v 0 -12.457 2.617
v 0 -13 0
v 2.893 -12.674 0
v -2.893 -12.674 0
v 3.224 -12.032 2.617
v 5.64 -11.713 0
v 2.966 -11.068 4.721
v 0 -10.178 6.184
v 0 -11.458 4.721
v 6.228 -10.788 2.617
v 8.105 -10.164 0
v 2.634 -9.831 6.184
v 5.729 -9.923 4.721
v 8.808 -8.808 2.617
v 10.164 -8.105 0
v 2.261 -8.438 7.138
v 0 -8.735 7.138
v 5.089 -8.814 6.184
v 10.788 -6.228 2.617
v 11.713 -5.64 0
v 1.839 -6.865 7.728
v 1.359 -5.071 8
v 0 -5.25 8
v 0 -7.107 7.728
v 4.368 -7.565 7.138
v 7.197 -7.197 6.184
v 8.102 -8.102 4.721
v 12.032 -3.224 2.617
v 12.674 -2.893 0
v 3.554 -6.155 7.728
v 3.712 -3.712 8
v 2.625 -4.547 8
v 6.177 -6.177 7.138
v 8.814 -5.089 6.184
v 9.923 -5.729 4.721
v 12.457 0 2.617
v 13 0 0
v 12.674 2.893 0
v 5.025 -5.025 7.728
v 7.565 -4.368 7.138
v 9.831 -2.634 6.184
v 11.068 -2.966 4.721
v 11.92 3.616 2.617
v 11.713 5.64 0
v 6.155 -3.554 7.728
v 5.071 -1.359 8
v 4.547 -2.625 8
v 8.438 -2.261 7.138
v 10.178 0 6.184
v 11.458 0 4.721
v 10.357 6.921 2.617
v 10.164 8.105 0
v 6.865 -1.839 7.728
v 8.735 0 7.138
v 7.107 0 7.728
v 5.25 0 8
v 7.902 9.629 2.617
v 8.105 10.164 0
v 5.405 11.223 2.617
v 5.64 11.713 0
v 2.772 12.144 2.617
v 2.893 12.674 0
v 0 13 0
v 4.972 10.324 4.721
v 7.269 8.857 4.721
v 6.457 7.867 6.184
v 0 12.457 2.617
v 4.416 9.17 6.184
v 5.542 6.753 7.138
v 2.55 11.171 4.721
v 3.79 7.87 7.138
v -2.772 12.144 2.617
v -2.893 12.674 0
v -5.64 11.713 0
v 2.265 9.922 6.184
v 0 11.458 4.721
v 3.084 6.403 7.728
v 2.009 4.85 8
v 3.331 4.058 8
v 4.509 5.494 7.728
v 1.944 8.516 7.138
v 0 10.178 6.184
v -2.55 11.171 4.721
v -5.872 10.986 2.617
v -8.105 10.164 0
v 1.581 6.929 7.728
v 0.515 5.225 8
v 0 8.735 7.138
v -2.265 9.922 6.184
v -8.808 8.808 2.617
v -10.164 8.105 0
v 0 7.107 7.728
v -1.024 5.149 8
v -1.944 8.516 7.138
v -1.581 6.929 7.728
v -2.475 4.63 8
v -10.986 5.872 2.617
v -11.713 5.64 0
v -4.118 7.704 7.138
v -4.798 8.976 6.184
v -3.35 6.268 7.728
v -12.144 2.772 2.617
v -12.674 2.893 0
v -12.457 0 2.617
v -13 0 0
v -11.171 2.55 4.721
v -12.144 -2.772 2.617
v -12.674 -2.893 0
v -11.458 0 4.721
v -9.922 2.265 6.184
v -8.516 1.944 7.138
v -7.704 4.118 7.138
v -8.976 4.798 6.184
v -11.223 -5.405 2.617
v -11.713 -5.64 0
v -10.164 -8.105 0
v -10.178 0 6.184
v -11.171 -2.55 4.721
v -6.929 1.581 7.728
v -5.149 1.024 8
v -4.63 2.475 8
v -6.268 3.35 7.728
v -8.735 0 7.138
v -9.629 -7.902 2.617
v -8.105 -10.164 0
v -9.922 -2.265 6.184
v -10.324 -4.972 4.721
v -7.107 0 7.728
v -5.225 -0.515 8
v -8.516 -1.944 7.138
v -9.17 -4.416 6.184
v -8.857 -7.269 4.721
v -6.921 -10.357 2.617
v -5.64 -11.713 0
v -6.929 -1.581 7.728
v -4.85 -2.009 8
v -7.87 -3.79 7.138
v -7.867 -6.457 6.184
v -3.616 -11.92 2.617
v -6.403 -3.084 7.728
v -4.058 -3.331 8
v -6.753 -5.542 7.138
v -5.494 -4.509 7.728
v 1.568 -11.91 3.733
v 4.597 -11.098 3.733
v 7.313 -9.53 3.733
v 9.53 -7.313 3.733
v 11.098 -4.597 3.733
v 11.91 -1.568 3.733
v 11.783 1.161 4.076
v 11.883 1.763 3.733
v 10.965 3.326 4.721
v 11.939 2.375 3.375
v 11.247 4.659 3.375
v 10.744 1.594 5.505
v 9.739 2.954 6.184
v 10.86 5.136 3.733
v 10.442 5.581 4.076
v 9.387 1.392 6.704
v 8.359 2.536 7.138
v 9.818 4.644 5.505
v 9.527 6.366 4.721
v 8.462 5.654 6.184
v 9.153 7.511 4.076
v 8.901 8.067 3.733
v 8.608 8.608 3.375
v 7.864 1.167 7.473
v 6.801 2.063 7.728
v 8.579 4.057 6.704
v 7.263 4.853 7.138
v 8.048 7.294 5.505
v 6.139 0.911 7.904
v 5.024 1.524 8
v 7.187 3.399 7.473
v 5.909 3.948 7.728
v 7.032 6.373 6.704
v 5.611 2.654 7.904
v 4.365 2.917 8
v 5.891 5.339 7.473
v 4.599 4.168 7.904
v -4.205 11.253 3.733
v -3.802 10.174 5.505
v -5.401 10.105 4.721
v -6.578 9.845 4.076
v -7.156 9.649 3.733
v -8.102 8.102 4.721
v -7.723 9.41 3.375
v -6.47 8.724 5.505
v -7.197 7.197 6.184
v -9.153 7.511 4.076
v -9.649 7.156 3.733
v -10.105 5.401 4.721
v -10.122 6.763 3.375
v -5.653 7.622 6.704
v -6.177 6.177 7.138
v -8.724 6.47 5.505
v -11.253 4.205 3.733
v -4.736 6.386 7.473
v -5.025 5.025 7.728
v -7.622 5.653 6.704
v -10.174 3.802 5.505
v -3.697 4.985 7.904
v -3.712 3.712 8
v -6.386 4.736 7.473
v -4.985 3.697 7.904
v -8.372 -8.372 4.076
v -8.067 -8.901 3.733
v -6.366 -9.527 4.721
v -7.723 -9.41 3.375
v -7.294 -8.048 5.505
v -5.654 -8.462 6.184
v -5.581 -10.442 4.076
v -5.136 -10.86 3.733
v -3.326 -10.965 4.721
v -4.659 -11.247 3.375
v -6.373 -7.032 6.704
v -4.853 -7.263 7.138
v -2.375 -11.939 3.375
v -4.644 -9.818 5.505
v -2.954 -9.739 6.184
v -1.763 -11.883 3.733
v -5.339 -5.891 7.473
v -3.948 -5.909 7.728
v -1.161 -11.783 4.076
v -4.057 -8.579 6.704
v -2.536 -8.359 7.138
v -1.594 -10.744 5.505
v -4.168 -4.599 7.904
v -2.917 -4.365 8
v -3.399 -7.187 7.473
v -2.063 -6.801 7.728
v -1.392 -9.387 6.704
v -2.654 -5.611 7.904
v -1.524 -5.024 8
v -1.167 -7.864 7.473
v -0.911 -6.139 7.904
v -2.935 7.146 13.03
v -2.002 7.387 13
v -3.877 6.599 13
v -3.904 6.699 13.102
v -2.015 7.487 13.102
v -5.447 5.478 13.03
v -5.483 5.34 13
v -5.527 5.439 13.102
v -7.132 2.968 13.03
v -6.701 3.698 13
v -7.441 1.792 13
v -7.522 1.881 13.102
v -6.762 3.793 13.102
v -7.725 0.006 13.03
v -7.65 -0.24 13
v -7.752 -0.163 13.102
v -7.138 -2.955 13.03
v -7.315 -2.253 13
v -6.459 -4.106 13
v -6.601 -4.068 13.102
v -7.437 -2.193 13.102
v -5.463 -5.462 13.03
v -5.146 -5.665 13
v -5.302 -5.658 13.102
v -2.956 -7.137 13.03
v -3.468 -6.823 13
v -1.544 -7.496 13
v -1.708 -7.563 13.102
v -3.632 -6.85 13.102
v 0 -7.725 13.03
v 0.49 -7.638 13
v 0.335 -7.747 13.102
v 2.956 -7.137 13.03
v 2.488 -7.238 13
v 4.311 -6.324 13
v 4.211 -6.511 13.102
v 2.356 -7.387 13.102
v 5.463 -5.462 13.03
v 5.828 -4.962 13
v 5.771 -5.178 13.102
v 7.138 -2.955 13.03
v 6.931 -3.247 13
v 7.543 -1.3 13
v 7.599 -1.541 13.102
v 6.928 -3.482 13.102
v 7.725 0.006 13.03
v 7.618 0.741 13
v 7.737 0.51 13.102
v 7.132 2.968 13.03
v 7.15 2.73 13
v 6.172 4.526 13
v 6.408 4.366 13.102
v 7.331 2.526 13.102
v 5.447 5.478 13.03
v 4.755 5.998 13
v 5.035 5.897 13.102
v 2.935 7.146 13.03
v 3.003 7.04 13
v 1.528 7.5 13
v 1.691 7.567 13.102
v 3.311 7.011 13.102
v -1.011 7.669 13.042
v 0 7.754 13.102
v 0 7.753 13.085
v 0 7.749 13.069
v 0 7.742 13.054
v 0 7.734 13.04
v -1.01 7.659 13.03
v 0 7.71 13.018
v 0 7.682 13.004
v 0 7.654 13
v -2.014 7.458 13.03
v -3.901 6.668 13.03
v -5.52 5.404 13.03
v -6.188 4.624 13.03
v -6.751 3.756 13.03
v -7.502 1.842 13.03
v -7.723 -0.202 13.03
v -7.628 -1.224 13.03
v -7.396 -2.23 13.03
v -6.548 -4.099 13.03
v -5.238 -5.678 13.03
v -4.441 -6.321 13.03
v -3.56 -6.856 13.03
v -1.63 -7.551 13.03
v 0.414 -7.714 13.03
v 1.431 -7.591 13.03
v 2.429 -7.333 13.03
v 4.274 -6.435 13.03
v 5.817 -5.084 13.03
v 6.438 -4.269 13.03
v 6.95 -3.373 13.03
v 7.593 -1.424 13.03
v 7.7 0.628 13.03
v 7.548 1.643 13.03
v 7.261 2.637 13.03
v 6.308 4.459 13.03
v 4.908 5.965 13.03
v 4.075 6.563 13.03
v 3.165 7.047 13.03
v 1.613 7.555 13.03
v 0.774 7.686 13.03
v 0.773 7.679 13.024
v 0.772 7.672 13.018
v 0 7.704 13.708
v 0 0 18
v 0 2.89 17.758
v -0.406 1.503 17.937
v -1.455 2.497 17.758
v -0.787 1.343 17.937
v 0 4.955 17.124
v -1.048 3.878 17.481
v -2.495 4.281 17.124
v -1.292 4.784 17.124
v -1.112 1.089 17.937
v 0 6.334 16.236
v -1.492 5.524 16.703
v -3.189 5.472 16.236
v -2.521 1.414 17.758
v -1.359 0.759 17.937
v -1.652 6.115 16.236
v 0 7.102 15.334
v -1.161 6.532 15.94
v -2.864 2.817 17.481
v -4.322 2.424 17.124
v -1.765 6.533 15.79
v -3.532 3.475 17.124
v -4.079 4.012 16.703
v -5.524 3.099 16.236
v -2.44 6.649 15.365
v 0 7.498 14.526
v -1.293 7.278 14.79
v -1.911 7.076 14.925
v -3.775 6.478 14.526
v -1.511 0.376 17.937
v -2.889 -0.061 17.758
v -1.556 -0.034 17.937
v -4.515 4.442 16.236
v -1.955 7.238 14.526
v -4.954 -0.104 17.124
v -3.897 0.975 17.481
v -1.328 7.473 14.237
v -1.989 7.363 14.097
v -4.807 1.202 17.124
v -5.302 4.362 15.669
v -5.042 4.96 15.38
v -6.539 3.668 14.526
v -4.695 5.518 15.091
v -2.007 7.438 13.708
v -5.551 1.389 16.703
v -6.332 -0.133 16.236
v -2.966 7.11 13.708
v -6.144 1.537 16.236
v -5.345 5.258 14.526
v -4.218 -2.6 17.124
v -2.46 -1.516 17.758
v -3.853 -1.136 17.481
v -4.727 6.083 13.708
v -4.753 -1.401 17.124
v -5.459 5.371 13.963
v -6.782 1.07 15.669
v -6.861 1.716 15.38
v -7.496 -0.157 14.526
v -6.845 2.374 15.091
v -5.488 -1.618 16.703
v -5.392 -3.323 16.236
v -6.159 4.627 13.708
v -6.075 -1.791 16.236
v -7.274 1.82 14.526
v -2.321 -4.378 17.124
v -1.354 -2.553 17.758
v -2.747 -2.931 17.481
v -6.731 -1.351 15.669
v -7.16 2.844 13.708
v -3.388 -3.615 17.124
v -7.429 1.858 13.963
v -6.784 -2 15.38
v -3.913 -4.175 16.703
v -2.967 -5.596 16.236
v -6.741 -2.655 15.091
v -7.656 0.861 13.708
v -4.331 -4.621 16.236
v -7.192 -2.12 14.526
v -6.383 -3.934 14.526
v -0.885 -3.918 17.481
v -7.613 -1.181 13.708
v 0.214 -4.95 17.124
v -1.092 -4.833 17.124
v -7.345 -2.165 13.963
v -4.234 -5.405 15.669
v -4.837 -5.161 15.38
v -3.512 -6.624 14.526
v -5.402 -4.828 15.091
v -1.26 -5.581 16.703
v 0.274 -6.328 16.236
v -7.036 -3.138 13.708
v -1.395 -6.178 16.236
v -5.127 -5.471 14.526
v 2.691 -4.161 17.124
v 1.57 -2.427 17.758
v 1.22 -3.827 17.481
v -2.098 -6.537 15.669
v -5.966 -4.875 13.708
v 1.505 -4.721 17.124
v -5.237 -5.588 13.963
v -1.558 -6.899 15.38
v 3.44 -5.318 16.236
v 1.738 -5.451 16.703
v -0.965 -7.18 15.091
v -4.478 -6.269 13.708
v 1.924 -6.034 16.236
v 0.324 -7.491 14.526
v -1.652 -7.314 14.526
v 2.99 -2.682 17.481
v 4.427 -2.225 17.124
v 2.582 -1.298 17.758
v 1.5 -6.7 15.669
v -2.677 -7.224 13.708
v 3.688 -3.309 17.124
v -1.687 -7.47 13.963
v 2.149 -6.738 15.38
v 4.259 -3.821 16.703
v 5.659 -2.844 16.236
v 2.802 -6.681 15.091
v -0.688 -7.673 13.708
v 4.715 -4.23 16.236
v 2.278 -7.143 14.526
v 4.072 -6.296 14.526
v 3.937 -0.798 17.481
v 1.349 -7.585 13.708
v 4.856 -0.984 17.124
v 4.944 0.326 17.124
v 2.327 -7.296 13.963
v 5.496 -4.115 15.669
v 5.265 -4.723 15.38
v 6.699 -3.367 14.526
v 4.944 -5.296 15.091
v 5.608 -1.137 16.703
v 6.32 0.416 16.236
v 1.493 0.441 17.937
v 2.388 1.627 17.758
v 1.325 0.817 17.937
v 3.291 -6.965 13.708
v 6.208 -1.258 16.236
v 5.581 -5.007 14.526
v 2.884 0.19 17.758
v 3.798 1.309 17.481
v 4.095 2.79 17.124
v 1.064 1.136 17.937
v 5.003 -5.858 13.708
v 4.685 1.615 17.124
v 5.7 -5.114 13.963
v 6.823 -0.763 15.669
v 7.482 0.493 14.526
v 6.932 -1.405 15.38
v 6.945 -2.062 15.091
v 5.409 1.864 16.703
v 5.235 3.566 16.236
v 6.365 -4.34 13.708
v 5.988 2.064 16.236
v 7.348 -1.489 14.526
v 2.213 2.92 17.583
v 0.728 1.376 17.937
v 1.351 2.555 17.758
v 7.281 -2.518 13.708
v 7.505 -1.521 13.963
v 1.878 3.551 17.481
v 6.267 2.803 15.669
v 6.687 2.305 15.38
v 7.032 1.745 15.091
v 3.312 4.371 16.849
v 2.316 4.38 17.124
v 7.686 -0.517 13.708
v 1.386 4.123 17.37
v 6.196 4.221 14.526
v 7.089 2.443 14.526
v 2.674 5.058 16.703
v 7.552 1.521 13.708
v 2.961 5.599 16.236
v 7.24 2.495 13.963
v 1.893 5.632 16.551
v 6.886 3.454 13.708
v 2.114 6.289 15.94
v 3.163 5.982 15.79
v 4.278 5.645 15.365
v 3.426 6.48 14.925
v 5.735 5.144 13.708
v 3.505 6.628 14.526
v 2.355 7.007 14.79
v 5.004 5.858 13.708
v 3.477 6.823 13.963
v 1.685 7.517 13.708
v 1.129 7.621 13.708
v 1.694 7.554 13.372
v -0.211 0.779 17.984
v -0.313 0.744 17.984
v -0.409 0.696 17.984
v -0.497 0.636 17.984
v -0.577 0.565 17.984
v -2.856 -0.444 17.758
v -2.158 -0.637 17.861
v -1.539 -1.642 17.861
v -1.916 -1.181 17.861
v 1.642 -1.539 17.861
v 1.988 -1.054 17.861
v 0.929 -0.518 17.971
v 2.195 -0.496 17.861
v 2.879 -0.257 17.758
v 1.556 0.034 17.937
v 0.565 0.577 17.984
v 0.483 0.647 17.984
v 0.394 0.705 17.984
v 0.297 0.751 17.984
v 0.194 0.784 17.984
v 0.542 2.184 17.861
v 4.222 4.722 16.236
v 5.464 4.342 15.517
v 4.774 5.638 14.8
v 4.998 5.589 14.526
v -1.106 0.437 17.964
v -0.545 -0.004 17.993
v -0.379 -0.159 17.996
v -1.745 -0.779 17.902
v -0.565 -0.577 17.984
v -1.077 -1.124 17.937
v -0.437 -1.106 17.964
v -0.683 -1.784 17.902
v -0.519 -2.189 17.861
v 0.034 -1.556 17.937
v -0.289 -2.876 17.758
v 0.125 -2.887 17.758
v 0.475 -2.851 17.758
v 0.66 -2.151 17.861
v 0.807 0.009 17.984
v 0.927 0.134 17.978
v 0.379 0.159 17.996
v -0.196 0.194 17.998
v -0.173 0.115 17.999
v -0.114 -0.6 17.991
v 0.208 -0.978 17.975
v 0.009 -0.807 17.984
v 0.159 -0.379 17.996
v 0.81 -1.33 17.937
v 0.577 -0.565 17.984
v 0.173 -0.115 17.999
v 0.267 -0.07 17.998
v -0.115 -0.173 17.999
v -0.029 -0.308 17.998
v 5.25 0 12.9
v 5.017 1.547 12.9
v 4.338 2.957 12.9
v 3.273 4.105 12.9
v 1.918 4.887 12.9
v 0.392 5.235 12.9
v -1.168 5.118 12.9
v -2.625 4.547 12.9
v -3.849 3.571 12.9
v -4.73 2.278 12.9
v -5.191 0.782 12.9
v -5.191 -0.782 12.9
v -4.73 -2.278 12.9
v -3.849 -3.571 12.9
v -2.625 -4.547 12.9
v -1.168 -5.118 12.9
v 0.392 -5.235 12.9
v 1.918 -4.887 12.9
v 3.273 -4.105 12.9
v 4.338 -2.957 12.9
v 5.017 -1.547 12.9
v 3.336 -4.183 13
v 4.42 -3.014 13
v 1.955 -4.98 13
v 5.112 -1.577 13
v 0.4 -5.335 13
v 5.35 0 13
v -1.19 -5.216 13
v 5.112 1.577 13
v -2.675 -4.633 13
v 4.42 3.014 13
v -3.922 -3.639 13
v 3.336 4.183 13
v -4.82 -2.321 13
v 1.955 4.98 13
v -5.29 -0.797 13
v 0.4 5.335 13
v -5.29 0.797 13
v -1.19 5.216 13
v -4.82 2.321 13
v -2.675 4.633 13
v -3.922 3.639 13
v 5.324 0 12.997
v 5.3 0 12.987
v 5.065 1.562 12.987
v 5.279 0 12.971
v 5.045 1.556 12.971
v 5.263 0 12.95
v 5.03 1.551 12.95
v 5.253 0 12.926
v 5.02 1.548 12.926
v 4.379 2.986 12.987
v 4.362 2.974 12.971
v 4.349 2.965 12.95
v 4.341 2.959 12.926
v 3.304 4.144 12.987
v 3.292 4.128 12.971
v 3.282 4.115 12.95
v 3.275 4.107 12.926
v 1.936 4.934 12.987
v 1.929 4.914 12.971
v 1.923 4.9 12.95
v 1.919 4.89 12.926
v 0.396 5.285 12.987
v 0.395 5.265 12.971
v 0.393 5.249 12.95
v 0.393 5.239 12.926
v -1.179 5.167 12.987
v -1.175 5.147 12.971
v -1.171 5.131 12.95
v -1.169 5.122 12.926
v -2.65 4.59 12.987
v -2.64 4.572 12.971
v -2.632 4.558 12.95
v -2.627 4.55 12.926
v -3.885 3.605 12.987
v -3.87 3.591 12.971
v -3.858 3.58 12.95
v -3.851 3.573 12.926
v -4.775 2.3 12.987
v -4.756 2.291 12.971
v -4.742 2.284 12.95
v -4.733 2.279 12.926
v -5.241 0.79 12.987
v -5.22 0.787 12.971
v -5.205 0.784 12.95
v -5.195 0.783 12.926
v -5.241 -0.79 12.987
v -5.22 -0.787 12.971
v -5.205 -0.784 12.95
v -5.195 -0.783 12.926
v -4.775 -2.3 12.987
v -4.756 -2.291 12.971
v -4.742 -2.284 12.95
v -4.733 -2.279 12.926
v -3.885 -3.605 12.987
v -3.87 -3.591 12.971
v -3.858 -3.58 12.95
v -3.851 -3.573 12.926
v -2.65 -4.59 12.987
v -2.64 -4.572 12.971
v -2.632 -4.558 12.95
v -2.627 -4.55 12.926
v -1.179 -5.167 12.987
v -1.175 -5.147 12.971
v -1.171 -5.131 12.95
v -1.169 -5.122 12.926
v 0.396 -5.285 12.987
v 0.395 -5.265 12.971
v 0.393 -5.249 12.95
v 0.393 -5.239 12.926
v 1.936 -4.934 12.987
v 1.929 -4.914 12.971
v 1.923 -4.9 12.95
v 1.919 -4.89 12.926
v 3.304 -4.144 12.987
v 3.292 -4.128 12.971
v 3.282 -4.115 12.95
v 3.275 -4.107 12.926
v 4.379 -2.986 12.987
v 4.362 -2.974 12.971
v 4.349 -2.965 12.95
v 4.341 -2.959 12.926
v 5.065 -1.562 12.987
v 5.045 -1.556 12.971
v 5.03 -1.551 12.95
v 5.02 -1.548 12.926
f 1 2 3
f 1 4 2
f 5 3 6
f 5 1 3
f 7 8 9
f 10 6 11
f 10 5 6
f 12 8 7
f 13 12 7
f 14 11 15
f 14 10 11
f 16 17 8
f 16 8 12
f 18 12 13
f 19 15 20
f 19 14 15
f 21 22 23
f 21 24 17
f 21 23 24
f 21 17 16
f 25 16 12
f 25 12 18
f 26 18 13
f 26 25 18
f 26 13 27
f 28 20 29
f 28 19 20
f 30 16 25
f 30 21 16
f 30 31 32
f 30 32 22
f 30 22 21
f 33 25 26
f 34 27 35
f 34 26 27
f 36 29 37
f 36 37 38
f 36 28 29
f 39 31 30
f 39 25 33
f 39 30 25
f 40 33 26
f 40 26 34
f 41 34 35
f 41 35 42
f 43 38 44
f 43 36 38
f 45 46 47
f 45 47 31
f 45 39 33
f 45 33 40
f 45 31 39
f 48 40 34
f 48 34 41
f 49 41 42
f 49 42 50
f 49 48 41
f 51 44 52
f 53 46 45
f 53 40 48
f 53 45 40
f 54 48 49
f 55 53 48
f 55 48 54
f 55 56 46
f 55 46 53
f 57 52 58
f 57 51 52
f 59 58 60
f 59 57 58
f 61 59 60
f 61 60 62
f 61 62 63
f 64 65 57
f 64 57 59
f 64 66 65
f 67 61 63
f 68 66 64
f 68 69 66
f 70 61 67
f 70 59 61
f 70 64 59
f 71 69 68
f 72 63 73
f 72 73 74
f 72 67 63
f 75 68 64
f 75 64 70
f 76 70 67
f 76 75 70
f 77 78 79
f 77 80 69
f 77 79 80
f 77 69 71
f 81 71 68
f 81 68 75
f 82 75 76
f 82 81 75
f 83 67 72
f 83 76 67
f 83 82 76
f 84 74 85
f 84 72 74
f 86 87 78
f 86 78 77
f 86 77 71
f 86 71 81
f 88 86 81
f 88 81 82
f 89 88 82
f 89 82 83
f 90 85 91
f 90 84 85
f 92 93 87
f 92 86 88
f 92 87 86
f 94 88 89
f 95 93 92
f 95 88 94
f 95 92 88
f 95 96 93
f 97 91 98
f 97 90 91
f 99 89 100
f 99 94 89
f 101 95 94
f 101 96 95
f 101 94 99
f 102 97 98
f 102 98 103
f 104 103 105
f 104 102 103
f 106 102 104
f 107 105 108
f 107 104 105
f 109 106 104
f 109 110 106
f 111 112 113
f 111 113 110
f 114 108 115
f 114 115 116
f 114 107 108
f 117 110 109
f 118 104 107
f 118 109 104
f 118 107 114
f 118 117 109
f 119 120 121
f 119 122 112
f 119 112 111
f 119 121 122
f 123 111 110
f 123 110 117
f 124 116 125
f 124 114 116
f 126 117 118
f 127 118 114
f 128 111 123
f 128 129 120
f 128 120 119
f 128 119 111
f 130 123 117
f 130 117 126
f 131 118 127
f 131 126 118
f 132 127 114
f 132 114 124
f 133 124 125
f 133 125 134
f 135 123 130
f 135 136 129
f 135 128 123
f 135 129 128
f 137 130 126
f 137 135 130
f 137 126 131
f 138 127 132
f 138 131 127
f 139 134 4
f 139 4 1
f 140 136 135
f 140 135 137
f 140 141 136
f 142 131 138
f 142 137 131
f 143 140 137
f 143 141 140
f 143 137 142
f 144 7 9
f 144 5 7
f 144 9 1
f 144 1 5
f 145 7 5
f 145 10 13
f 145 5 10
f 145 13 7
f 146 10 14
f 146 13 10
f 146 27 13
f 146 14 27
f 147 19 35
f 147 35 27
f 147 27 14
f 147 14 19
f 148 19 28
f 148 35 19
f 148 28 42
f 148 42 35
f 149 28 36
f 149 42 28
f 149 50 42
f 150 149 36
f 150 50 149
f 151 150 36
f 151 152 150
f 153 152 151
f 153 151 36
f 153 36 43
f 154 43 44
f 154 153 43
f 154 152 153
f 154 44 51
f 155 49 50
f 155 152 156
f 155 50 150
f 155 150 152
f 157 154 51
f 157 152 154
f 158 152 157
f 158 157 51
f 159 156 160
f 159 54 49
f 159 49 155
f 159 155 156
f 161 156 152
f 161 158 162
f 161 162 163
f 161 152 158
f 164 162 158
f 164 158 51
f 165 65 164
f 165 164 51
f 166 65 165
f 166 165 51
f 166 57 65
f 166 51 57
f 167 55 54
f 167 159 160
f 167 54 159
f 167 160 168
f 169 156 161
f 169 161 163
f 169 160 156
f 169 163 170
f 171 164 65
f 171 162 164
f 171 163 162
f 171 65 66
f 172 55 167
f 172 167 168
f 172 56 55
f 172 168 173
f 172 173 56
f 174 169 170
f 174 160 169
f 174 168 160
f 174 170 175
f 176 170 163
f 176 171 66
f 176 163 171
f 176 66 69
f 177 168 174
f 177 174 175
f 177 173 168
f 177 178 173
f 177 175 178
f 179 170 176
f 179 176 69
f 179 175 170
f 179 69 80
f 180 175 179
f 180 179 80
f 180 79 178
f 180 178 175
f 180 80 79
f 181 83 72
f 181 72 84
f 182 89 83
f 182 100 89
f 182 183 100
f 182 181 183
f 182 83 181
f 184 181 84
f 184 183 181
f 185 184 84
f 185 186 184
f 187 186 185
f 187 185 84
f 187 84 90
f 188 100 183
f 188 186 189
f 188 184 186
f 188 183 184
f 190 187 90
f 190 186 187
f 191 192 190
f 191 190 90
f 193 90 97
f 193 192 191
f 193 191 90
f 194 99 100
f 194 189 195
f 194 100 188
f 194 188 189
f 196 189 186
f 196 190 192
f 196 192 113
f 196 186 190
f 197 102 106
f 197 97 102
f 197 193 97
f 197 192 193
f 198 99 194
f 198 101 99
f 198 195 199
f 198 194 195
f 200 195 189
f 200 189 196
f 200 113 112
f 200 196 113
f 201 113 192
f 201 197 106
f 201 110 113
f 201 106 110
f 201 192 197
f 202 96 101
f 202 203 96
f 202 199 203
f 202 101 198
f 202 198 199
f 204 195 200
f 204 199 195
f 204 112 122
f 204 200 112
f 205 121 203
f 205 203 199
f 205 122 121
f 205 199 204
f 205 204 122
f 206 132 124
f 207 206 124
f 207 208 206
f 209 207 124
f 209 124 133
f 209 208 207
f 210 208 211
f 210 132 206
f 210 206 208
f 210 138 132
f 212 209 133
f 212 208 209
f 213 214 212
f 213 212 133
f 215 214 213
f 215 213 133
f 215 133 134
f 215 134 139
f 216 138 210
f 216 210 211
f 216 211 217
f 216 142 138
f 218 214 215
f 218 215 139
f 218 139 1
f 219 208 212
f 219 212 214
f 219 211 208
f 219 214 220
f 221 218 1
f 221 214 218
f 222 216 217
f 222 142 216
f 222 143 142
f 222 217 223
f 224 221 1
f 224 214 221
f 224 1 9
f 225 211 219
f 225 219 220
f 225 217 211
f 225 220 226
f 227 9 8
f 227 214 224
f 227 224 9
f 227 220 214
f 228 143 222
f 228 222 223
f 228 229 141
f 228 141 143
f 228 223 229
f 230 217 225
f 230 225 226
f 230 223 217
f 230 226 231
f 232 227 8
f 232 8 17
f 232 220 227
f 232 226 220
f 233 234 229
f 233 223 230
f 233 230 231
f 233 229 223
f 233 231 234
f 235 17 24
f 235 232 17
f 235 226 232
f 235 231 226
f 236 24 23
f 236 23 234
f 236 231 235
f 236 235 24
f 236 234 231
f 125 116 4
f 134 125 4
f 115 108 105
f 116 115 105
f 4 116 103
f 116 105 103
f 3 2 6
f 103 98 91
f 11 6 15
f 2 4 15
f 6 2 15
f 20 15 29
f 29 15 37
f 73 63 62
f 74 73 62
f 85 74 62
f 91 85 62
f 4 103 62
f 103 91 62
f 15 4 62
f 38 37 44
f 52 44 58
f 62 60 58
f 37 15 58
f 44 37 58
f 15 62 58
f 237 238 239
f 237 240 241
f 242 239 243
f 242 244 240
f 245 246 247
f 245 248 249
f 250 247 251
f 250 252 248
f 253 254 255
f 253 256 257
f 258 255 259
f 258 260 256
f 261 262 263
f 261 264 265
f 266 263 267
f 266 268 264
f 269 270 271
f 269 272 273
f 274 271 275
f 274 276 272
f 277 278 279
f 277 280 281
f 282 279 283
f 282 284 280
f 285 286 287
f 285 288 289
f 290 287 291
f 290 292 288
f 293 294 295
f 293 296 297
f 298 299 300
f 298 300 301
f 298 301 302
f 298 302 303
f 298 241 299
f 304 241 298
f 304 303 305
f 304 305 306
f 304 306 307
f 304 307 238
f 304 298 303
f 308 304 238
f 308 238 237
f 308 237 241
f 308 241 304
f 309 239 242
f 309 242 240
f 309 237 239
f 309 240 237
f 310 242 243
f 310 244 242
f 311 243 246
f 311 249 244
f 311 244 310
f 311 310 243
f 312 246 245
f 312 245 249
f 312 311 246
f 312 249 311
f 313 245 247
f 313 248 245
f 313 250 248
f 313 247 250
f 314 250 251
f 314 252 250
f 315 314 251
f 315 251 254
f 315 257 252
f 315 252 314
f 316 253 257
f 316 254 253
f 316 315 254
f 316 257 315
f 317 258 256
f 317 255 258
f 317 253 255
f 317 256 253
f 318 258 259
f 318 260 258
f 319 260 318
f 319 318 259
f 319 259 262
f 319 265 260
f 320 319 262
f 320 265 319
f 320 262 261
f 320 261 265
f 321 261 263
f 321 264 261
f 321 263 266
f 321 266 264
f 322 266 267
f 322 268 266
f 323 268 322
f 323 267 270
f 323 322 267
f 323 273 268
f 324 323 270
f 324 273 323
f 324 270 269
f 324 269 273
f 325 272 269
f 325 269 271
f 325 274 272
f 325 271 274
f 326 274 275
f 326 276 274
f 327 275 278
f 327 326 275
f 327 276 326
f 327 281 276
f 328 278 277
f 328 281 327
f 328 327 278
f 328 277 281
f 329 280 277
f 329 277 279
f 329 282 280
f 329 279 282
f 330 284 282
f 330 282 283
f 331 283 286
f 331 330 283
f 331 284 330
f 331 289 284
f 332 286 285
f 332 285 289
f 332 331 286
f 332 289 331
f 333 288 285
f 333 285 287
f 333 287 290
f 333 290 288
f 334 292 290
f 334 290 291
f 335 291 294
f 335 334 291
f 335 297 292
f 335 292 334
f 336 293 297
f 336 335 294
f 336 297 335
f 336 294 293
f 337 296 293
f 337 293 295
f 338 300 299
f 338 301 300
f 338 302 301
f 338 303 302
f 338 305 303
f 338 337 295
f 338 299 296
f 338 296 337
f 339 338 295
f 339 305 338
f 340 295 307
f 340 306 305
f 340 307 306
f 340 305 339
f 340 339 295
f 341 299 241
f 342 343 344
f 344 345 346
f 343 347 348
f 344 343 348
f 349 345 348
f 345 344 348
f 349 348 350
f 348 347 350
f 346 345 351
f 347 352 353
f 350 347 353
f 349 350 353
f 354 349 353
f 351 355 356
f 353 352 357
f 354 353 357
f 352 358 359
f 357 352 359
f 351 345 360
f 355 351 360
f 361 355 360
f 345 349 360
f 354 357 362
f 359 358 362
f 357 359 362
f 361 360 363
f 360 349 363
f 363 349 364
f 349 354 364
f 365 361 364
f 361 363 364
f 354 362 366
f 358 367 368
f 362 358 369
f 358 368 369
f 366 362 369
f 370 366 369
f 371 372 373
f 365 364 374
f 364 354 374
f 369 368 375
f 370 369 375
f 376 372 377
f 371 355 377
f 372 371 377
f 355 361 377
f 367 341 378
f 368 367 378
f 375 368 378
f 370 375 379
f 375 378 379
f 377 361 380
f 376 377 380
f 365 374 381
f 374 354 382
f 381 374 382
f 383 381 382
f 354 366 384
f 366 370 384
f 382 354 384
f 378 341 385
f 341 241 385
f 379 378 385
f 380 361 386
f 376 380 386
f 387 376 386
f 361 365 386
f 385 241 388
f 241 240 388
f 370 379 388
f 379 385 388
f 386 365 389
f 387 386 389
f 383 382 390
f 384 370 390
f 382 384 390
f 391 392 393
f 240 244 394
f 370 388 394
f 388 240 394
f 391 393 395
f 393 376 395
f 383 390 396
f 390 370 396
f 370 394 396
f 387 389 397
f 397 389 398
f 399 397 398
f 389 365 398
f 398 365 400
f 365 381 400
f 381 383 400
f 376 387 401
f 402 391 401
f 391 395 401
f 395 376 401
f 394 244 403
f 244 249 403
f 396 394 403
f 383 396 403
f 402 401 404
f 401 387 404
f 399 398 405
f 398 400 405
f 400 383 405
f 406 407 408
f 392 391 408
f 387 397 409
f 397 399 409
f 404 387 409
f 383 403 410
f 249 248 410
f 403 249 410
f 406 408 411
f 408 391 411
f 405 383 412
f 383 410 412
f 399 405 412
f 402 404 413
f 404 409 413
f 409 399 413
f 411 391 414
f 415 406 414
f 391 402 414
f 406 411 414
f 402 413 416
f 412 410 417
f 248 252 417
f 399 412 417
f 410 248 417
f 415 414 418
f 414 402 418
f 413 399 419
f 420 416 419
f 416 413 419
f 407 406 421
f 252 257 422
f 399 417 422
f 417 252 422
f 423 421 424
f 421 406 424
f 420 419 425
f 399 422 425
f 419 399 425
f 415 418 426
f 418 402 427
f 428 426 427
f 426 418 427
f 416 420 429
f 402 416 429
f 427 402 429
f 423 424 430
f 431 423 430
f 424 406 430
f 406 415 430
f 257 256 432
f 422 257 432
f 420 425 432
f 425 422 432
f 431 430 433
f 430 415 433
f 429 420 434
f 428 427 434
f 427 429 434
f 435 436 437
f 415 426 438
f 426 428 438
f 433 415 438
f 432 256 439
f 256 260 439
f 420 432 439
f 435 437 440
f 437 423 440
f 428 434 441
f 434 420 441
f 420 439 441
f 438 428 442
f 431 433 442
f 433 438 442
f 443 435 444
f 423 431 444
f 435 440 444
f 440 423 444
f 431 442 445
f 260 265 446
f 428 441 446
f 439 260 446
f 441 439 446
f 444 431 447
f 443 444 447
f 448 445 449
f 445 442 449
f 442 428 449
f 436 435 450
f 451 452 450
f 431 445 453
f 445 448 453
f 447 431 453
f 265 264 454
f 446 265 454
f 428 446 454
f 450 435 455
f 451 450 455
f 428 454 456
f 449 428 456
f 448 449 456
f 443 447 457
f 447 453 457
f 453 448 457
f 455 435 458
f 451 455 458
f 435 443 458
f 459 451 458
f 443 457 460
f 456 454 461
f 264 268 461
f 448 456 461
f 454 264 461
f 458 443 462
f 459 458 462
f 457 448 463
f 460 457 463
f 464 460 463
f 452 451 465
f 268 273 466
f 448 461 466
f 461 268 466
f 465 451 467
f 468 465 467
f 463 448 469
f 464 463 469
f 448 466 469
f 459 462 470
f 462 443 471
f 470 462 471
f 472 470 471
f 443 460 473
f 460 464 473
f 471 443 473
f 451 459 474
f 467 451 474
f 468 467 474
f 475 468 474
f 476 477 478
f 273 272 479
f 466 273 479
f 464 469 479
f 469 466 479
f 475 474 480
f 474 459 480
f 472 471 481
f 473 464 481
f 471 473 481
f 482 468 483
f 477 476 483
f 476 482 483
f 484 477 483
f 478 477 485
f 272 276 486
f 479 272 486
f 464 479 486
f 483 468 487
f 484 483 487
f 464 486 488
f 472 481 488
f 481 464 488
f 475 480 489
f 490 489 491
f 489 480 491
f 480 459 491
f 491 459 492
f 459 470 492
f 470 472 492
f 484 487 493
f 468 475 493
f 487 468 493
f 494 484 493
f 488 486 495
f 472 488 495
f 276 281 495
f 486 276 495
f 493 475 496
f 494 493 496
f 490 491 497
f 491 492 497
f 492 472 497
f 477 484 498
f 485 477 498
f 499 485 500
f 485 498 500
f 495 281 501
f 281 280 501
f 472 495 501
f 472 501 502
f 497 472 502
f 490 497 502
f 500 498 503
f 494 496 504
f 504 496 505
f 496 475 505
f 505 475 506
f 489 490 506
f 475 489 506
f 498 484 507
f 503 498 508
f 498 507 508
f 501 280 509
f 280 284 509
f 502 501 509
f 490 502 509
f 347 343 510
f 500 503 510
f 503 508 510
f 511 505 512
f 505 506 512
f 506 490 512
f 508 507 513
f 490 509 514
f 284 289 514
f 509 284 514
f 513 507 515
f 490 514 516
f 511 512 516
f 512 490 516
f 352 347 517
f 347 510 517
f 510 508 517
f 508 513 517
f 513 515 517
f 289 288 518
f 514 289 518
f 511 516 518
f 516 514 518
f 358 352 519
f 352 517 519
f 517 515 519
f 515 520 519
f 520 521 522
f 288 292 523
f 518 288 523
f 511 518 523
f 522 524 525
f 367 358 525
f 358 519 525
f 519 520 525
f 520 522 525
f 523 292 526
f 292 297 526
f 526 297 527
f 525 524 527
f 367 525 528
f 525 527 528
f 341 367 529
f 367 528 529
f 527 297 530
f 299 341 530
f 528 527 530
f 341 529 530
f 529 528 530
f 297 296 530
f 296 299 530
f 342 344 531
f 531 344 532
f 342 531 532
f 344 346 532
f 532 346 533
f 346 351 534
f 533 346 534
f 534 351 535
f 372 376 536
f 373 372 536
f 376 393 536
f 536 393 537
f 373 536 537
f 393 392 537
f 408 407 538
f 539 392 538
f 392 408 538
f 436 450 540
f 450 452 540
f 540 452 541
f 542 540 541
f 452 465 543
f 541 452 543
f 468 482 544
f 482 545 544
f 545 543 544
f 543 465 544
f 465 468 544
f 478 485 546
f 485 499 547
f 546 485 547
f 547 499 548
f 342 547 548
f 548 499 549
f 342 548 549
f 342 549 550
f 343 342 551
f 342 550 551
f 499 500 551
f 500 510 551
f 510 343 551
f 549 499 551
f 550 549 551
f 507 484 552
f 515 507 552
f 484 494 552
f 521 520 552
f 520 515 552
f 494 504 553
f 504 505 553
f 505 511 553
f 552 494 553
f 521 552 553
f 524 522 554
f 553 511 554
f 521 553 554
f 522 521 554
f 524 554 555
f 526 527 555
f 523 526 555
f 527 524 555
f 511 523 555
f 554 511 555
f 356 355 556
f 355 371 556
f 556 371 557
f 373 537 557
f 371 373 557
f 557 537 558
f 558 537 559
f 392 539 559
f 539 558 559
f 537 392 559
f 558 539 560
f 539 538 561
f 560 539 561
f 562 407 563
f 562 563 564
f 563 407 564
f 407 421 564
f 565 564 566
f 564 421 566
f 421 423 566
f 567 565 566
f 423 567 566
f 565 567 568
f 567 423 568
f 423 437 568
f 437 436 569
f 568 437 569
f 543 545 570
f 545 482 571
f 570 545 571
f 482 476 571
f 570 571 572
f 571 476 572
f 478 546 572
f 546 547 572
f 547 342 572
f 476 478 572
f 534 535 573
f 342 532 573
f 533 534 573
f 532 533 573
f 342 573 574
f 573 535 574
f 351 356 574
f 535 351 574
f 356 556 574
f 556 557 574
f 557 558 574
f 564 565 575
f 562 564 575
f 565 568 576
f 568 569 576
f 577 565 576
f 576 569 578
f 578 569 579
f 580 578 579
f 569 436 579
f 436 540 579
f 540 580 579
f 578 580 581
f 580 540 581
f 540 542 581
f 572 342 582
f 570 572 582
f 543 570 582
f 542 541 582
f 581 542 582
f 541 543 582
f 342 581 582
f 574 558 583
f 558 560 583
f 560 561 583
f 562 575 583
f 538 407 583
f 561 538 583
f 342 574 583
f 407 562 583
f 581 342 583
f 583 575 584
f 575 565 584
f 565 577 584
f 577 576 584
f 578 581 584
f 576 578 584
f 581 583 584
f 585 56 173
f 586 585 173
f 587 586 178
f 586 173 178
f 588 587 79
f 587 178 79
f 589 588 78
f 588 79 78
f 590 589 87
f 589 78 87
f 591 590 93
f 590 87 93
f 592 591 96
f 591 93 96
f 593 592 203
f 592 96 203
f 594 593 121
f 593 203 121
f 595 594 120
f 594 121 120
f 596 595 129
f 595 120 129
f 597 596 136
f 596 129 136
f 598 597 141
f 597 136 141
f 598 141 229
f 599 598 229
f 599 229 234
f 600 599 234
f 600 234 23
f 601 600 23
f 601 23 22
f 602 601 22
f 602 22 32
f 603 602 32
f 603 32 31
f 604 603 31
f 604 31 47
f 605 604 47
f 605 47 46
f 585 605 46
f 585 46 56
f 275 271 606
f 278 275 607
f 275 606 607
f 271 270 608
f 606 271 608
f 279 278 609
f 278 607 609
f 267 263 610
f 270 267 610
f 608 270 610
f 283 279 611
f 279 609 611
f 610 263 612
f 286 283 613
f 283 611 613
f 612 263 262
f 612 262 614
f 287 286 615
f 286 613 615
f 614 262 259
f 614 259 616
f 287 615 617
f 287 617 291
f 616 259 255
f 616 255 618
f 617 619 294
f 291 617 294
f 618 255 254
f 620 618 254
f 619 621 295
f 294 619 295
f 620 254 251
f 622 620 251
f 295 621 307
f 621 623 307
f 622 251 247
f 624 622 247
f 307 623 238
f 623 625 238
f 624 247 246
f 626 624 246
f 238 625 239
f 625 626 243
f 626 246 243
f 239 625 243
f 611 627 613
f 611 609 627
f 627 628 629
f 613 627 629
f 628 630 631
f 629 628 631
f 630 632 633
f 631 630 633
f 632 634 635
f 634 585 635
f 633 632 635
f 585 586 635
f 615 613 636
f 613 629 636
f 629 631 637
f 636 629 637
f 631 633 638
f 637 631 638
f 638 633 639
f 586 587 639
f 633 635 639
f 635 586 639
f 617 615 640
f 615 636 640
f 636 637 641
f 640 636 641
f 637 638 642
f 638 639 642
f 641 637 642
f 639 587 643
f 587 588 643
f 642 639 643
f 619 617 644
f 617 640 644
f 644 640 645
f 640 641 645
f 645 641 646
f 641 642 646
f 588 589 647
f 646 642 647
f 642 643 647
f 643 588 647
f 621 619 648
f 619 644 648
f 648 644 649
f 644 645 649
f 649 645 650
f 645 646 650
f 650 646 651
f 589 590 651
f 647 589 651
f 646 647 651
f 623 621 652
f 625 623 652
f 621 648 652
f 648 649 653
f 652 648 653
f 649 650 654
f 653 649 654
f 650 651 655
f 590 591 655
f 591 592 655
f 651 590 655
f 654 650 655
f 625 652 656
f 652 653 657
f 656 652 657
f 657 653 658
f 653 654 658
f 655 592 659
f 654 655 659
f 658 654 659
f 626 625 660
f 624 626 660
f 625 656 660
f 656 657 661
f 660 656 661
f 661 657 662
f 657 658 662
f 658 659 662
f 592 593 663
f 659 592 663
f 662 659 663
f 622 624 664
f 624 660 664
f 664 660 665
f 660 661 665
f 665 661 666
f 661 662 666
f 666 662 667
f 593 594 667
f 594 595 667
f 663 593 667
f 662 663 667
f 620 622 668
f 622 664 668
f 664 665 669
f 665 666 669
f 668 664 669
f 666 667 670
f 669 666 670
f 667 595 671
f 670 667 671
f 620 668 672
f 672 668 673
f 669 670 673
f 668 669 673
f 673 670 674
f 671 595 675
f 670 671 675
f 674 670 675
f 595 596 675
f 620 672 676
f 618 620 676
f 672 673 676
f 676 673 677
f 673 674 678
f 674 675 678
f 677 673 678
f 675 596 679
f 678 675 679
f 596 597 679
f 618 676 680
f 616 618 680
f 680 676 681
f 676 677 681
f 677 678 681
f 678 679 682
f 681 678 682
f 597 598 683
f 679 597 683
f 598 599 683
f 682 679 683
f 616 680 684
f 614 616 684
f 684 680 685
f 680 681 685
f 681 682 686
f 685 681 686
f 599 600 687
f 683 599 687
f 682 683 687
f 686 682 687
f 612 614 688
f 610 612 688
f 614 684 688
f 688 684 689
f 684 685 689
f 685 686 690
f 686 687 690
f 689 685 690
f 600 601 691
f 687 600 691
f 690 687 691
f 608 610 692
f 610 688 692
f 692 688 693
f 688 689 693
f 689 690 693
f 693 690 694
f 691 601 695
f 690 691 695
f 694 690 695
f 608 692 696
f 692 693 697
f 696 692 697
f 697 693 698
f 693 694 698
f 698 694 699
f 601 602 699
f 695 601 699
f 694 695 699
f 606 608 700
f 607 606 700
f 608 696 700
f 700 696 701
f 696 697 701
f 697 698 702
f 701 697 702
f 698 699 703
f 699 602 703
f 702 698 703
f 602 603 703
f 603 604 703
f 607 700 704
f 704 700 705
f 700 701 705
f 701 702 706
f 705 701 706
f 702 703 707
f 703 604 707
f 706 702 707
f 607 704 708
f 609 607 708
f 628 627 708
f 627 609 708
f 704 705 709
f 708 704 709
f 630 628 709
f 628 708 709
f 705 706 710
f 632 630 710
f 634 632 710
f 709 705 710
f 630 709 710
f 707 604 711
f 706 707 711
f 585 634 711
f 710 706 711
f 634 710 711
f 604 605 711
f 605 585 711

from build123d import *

# Parameters (mm, degrees)
SKETCH_2_R      = 5.25
EXTRUDE_1_DEPTH = 8
SKETCH_4_R      = 5.25
EXTRUDE_2_DEPTH = 5
FILLET_1_R      = 0.1


with BuildPart() as part:
    # 草图2 → 凸台-拉伸1 (new body)
    with BuildSketch(Plane.XY):
        Circle(SKETCH_2_R)
    extrude(amount=EXTRUDE_1_DEPTH)

    # 草图3 → 旋转1 (revolve)
    with BuildSketch(Plane(origin=(0, 0, 0), x_dir=(0, 0, -1), z_dir=(1, 0, 0))):
        with BuildLine():
            Line((-8, 0), (-8, -5.25))
            add(Edge.make_bspline(
                [(0, -13), (-5.068934353, -12.456863927), (-7.746723487, -9.679032619), (-8, -5.25)],
                knots=[0, 0, 0, 0, 1, 1, 1, 1], degree=3))
            Line((0, -13), (0, 0))
            Line((0, 0), (-8, 0))
        make_face()
    revolve(axis=Axis((0, 0, 0), (0, 0, 1)))

    # 草图4 → 凸台-拉伸2 (add)
    with BuildSketch(Plane.XY.offset(8)):
        Circle(SKETCH_4_R)
    extrude(amount=EXTRUDE_2_DEPTH)

    # 草图6 → 旋转2 (revolve)
    with BuildSketch(Plane(origin=(0, 0, 0), x_dir=(0, 0, -1), z_dir=(1, 0, 0))):
        with BuildLine():
            Line((-13, 0), (-18, 0))
            add(Edge.make_bspline(
                [(-18, 0), (-18, 7.56404748), (-13.939261077, 7.75465321), (-13, 7.75465321)],
                knots=[0, 0, 0, 0, 1, 1, 1, 1], degree=3))
            Line((-13, 7.75465321), (-13, 0))
        make_face()
    revolve(axis=Axis((0, 0, 13), (0, 0, 1)))

    # 圆角1
    fillet_1_edges = [part.edges().sort_by_distance(p)[0] for p in [
        (-5.25, 0, 13),
        (0, -7.75465321, 13),
    ]]
    fillet(fillet_1_edges, radius=FILLET_1_R)


solid = part.part
